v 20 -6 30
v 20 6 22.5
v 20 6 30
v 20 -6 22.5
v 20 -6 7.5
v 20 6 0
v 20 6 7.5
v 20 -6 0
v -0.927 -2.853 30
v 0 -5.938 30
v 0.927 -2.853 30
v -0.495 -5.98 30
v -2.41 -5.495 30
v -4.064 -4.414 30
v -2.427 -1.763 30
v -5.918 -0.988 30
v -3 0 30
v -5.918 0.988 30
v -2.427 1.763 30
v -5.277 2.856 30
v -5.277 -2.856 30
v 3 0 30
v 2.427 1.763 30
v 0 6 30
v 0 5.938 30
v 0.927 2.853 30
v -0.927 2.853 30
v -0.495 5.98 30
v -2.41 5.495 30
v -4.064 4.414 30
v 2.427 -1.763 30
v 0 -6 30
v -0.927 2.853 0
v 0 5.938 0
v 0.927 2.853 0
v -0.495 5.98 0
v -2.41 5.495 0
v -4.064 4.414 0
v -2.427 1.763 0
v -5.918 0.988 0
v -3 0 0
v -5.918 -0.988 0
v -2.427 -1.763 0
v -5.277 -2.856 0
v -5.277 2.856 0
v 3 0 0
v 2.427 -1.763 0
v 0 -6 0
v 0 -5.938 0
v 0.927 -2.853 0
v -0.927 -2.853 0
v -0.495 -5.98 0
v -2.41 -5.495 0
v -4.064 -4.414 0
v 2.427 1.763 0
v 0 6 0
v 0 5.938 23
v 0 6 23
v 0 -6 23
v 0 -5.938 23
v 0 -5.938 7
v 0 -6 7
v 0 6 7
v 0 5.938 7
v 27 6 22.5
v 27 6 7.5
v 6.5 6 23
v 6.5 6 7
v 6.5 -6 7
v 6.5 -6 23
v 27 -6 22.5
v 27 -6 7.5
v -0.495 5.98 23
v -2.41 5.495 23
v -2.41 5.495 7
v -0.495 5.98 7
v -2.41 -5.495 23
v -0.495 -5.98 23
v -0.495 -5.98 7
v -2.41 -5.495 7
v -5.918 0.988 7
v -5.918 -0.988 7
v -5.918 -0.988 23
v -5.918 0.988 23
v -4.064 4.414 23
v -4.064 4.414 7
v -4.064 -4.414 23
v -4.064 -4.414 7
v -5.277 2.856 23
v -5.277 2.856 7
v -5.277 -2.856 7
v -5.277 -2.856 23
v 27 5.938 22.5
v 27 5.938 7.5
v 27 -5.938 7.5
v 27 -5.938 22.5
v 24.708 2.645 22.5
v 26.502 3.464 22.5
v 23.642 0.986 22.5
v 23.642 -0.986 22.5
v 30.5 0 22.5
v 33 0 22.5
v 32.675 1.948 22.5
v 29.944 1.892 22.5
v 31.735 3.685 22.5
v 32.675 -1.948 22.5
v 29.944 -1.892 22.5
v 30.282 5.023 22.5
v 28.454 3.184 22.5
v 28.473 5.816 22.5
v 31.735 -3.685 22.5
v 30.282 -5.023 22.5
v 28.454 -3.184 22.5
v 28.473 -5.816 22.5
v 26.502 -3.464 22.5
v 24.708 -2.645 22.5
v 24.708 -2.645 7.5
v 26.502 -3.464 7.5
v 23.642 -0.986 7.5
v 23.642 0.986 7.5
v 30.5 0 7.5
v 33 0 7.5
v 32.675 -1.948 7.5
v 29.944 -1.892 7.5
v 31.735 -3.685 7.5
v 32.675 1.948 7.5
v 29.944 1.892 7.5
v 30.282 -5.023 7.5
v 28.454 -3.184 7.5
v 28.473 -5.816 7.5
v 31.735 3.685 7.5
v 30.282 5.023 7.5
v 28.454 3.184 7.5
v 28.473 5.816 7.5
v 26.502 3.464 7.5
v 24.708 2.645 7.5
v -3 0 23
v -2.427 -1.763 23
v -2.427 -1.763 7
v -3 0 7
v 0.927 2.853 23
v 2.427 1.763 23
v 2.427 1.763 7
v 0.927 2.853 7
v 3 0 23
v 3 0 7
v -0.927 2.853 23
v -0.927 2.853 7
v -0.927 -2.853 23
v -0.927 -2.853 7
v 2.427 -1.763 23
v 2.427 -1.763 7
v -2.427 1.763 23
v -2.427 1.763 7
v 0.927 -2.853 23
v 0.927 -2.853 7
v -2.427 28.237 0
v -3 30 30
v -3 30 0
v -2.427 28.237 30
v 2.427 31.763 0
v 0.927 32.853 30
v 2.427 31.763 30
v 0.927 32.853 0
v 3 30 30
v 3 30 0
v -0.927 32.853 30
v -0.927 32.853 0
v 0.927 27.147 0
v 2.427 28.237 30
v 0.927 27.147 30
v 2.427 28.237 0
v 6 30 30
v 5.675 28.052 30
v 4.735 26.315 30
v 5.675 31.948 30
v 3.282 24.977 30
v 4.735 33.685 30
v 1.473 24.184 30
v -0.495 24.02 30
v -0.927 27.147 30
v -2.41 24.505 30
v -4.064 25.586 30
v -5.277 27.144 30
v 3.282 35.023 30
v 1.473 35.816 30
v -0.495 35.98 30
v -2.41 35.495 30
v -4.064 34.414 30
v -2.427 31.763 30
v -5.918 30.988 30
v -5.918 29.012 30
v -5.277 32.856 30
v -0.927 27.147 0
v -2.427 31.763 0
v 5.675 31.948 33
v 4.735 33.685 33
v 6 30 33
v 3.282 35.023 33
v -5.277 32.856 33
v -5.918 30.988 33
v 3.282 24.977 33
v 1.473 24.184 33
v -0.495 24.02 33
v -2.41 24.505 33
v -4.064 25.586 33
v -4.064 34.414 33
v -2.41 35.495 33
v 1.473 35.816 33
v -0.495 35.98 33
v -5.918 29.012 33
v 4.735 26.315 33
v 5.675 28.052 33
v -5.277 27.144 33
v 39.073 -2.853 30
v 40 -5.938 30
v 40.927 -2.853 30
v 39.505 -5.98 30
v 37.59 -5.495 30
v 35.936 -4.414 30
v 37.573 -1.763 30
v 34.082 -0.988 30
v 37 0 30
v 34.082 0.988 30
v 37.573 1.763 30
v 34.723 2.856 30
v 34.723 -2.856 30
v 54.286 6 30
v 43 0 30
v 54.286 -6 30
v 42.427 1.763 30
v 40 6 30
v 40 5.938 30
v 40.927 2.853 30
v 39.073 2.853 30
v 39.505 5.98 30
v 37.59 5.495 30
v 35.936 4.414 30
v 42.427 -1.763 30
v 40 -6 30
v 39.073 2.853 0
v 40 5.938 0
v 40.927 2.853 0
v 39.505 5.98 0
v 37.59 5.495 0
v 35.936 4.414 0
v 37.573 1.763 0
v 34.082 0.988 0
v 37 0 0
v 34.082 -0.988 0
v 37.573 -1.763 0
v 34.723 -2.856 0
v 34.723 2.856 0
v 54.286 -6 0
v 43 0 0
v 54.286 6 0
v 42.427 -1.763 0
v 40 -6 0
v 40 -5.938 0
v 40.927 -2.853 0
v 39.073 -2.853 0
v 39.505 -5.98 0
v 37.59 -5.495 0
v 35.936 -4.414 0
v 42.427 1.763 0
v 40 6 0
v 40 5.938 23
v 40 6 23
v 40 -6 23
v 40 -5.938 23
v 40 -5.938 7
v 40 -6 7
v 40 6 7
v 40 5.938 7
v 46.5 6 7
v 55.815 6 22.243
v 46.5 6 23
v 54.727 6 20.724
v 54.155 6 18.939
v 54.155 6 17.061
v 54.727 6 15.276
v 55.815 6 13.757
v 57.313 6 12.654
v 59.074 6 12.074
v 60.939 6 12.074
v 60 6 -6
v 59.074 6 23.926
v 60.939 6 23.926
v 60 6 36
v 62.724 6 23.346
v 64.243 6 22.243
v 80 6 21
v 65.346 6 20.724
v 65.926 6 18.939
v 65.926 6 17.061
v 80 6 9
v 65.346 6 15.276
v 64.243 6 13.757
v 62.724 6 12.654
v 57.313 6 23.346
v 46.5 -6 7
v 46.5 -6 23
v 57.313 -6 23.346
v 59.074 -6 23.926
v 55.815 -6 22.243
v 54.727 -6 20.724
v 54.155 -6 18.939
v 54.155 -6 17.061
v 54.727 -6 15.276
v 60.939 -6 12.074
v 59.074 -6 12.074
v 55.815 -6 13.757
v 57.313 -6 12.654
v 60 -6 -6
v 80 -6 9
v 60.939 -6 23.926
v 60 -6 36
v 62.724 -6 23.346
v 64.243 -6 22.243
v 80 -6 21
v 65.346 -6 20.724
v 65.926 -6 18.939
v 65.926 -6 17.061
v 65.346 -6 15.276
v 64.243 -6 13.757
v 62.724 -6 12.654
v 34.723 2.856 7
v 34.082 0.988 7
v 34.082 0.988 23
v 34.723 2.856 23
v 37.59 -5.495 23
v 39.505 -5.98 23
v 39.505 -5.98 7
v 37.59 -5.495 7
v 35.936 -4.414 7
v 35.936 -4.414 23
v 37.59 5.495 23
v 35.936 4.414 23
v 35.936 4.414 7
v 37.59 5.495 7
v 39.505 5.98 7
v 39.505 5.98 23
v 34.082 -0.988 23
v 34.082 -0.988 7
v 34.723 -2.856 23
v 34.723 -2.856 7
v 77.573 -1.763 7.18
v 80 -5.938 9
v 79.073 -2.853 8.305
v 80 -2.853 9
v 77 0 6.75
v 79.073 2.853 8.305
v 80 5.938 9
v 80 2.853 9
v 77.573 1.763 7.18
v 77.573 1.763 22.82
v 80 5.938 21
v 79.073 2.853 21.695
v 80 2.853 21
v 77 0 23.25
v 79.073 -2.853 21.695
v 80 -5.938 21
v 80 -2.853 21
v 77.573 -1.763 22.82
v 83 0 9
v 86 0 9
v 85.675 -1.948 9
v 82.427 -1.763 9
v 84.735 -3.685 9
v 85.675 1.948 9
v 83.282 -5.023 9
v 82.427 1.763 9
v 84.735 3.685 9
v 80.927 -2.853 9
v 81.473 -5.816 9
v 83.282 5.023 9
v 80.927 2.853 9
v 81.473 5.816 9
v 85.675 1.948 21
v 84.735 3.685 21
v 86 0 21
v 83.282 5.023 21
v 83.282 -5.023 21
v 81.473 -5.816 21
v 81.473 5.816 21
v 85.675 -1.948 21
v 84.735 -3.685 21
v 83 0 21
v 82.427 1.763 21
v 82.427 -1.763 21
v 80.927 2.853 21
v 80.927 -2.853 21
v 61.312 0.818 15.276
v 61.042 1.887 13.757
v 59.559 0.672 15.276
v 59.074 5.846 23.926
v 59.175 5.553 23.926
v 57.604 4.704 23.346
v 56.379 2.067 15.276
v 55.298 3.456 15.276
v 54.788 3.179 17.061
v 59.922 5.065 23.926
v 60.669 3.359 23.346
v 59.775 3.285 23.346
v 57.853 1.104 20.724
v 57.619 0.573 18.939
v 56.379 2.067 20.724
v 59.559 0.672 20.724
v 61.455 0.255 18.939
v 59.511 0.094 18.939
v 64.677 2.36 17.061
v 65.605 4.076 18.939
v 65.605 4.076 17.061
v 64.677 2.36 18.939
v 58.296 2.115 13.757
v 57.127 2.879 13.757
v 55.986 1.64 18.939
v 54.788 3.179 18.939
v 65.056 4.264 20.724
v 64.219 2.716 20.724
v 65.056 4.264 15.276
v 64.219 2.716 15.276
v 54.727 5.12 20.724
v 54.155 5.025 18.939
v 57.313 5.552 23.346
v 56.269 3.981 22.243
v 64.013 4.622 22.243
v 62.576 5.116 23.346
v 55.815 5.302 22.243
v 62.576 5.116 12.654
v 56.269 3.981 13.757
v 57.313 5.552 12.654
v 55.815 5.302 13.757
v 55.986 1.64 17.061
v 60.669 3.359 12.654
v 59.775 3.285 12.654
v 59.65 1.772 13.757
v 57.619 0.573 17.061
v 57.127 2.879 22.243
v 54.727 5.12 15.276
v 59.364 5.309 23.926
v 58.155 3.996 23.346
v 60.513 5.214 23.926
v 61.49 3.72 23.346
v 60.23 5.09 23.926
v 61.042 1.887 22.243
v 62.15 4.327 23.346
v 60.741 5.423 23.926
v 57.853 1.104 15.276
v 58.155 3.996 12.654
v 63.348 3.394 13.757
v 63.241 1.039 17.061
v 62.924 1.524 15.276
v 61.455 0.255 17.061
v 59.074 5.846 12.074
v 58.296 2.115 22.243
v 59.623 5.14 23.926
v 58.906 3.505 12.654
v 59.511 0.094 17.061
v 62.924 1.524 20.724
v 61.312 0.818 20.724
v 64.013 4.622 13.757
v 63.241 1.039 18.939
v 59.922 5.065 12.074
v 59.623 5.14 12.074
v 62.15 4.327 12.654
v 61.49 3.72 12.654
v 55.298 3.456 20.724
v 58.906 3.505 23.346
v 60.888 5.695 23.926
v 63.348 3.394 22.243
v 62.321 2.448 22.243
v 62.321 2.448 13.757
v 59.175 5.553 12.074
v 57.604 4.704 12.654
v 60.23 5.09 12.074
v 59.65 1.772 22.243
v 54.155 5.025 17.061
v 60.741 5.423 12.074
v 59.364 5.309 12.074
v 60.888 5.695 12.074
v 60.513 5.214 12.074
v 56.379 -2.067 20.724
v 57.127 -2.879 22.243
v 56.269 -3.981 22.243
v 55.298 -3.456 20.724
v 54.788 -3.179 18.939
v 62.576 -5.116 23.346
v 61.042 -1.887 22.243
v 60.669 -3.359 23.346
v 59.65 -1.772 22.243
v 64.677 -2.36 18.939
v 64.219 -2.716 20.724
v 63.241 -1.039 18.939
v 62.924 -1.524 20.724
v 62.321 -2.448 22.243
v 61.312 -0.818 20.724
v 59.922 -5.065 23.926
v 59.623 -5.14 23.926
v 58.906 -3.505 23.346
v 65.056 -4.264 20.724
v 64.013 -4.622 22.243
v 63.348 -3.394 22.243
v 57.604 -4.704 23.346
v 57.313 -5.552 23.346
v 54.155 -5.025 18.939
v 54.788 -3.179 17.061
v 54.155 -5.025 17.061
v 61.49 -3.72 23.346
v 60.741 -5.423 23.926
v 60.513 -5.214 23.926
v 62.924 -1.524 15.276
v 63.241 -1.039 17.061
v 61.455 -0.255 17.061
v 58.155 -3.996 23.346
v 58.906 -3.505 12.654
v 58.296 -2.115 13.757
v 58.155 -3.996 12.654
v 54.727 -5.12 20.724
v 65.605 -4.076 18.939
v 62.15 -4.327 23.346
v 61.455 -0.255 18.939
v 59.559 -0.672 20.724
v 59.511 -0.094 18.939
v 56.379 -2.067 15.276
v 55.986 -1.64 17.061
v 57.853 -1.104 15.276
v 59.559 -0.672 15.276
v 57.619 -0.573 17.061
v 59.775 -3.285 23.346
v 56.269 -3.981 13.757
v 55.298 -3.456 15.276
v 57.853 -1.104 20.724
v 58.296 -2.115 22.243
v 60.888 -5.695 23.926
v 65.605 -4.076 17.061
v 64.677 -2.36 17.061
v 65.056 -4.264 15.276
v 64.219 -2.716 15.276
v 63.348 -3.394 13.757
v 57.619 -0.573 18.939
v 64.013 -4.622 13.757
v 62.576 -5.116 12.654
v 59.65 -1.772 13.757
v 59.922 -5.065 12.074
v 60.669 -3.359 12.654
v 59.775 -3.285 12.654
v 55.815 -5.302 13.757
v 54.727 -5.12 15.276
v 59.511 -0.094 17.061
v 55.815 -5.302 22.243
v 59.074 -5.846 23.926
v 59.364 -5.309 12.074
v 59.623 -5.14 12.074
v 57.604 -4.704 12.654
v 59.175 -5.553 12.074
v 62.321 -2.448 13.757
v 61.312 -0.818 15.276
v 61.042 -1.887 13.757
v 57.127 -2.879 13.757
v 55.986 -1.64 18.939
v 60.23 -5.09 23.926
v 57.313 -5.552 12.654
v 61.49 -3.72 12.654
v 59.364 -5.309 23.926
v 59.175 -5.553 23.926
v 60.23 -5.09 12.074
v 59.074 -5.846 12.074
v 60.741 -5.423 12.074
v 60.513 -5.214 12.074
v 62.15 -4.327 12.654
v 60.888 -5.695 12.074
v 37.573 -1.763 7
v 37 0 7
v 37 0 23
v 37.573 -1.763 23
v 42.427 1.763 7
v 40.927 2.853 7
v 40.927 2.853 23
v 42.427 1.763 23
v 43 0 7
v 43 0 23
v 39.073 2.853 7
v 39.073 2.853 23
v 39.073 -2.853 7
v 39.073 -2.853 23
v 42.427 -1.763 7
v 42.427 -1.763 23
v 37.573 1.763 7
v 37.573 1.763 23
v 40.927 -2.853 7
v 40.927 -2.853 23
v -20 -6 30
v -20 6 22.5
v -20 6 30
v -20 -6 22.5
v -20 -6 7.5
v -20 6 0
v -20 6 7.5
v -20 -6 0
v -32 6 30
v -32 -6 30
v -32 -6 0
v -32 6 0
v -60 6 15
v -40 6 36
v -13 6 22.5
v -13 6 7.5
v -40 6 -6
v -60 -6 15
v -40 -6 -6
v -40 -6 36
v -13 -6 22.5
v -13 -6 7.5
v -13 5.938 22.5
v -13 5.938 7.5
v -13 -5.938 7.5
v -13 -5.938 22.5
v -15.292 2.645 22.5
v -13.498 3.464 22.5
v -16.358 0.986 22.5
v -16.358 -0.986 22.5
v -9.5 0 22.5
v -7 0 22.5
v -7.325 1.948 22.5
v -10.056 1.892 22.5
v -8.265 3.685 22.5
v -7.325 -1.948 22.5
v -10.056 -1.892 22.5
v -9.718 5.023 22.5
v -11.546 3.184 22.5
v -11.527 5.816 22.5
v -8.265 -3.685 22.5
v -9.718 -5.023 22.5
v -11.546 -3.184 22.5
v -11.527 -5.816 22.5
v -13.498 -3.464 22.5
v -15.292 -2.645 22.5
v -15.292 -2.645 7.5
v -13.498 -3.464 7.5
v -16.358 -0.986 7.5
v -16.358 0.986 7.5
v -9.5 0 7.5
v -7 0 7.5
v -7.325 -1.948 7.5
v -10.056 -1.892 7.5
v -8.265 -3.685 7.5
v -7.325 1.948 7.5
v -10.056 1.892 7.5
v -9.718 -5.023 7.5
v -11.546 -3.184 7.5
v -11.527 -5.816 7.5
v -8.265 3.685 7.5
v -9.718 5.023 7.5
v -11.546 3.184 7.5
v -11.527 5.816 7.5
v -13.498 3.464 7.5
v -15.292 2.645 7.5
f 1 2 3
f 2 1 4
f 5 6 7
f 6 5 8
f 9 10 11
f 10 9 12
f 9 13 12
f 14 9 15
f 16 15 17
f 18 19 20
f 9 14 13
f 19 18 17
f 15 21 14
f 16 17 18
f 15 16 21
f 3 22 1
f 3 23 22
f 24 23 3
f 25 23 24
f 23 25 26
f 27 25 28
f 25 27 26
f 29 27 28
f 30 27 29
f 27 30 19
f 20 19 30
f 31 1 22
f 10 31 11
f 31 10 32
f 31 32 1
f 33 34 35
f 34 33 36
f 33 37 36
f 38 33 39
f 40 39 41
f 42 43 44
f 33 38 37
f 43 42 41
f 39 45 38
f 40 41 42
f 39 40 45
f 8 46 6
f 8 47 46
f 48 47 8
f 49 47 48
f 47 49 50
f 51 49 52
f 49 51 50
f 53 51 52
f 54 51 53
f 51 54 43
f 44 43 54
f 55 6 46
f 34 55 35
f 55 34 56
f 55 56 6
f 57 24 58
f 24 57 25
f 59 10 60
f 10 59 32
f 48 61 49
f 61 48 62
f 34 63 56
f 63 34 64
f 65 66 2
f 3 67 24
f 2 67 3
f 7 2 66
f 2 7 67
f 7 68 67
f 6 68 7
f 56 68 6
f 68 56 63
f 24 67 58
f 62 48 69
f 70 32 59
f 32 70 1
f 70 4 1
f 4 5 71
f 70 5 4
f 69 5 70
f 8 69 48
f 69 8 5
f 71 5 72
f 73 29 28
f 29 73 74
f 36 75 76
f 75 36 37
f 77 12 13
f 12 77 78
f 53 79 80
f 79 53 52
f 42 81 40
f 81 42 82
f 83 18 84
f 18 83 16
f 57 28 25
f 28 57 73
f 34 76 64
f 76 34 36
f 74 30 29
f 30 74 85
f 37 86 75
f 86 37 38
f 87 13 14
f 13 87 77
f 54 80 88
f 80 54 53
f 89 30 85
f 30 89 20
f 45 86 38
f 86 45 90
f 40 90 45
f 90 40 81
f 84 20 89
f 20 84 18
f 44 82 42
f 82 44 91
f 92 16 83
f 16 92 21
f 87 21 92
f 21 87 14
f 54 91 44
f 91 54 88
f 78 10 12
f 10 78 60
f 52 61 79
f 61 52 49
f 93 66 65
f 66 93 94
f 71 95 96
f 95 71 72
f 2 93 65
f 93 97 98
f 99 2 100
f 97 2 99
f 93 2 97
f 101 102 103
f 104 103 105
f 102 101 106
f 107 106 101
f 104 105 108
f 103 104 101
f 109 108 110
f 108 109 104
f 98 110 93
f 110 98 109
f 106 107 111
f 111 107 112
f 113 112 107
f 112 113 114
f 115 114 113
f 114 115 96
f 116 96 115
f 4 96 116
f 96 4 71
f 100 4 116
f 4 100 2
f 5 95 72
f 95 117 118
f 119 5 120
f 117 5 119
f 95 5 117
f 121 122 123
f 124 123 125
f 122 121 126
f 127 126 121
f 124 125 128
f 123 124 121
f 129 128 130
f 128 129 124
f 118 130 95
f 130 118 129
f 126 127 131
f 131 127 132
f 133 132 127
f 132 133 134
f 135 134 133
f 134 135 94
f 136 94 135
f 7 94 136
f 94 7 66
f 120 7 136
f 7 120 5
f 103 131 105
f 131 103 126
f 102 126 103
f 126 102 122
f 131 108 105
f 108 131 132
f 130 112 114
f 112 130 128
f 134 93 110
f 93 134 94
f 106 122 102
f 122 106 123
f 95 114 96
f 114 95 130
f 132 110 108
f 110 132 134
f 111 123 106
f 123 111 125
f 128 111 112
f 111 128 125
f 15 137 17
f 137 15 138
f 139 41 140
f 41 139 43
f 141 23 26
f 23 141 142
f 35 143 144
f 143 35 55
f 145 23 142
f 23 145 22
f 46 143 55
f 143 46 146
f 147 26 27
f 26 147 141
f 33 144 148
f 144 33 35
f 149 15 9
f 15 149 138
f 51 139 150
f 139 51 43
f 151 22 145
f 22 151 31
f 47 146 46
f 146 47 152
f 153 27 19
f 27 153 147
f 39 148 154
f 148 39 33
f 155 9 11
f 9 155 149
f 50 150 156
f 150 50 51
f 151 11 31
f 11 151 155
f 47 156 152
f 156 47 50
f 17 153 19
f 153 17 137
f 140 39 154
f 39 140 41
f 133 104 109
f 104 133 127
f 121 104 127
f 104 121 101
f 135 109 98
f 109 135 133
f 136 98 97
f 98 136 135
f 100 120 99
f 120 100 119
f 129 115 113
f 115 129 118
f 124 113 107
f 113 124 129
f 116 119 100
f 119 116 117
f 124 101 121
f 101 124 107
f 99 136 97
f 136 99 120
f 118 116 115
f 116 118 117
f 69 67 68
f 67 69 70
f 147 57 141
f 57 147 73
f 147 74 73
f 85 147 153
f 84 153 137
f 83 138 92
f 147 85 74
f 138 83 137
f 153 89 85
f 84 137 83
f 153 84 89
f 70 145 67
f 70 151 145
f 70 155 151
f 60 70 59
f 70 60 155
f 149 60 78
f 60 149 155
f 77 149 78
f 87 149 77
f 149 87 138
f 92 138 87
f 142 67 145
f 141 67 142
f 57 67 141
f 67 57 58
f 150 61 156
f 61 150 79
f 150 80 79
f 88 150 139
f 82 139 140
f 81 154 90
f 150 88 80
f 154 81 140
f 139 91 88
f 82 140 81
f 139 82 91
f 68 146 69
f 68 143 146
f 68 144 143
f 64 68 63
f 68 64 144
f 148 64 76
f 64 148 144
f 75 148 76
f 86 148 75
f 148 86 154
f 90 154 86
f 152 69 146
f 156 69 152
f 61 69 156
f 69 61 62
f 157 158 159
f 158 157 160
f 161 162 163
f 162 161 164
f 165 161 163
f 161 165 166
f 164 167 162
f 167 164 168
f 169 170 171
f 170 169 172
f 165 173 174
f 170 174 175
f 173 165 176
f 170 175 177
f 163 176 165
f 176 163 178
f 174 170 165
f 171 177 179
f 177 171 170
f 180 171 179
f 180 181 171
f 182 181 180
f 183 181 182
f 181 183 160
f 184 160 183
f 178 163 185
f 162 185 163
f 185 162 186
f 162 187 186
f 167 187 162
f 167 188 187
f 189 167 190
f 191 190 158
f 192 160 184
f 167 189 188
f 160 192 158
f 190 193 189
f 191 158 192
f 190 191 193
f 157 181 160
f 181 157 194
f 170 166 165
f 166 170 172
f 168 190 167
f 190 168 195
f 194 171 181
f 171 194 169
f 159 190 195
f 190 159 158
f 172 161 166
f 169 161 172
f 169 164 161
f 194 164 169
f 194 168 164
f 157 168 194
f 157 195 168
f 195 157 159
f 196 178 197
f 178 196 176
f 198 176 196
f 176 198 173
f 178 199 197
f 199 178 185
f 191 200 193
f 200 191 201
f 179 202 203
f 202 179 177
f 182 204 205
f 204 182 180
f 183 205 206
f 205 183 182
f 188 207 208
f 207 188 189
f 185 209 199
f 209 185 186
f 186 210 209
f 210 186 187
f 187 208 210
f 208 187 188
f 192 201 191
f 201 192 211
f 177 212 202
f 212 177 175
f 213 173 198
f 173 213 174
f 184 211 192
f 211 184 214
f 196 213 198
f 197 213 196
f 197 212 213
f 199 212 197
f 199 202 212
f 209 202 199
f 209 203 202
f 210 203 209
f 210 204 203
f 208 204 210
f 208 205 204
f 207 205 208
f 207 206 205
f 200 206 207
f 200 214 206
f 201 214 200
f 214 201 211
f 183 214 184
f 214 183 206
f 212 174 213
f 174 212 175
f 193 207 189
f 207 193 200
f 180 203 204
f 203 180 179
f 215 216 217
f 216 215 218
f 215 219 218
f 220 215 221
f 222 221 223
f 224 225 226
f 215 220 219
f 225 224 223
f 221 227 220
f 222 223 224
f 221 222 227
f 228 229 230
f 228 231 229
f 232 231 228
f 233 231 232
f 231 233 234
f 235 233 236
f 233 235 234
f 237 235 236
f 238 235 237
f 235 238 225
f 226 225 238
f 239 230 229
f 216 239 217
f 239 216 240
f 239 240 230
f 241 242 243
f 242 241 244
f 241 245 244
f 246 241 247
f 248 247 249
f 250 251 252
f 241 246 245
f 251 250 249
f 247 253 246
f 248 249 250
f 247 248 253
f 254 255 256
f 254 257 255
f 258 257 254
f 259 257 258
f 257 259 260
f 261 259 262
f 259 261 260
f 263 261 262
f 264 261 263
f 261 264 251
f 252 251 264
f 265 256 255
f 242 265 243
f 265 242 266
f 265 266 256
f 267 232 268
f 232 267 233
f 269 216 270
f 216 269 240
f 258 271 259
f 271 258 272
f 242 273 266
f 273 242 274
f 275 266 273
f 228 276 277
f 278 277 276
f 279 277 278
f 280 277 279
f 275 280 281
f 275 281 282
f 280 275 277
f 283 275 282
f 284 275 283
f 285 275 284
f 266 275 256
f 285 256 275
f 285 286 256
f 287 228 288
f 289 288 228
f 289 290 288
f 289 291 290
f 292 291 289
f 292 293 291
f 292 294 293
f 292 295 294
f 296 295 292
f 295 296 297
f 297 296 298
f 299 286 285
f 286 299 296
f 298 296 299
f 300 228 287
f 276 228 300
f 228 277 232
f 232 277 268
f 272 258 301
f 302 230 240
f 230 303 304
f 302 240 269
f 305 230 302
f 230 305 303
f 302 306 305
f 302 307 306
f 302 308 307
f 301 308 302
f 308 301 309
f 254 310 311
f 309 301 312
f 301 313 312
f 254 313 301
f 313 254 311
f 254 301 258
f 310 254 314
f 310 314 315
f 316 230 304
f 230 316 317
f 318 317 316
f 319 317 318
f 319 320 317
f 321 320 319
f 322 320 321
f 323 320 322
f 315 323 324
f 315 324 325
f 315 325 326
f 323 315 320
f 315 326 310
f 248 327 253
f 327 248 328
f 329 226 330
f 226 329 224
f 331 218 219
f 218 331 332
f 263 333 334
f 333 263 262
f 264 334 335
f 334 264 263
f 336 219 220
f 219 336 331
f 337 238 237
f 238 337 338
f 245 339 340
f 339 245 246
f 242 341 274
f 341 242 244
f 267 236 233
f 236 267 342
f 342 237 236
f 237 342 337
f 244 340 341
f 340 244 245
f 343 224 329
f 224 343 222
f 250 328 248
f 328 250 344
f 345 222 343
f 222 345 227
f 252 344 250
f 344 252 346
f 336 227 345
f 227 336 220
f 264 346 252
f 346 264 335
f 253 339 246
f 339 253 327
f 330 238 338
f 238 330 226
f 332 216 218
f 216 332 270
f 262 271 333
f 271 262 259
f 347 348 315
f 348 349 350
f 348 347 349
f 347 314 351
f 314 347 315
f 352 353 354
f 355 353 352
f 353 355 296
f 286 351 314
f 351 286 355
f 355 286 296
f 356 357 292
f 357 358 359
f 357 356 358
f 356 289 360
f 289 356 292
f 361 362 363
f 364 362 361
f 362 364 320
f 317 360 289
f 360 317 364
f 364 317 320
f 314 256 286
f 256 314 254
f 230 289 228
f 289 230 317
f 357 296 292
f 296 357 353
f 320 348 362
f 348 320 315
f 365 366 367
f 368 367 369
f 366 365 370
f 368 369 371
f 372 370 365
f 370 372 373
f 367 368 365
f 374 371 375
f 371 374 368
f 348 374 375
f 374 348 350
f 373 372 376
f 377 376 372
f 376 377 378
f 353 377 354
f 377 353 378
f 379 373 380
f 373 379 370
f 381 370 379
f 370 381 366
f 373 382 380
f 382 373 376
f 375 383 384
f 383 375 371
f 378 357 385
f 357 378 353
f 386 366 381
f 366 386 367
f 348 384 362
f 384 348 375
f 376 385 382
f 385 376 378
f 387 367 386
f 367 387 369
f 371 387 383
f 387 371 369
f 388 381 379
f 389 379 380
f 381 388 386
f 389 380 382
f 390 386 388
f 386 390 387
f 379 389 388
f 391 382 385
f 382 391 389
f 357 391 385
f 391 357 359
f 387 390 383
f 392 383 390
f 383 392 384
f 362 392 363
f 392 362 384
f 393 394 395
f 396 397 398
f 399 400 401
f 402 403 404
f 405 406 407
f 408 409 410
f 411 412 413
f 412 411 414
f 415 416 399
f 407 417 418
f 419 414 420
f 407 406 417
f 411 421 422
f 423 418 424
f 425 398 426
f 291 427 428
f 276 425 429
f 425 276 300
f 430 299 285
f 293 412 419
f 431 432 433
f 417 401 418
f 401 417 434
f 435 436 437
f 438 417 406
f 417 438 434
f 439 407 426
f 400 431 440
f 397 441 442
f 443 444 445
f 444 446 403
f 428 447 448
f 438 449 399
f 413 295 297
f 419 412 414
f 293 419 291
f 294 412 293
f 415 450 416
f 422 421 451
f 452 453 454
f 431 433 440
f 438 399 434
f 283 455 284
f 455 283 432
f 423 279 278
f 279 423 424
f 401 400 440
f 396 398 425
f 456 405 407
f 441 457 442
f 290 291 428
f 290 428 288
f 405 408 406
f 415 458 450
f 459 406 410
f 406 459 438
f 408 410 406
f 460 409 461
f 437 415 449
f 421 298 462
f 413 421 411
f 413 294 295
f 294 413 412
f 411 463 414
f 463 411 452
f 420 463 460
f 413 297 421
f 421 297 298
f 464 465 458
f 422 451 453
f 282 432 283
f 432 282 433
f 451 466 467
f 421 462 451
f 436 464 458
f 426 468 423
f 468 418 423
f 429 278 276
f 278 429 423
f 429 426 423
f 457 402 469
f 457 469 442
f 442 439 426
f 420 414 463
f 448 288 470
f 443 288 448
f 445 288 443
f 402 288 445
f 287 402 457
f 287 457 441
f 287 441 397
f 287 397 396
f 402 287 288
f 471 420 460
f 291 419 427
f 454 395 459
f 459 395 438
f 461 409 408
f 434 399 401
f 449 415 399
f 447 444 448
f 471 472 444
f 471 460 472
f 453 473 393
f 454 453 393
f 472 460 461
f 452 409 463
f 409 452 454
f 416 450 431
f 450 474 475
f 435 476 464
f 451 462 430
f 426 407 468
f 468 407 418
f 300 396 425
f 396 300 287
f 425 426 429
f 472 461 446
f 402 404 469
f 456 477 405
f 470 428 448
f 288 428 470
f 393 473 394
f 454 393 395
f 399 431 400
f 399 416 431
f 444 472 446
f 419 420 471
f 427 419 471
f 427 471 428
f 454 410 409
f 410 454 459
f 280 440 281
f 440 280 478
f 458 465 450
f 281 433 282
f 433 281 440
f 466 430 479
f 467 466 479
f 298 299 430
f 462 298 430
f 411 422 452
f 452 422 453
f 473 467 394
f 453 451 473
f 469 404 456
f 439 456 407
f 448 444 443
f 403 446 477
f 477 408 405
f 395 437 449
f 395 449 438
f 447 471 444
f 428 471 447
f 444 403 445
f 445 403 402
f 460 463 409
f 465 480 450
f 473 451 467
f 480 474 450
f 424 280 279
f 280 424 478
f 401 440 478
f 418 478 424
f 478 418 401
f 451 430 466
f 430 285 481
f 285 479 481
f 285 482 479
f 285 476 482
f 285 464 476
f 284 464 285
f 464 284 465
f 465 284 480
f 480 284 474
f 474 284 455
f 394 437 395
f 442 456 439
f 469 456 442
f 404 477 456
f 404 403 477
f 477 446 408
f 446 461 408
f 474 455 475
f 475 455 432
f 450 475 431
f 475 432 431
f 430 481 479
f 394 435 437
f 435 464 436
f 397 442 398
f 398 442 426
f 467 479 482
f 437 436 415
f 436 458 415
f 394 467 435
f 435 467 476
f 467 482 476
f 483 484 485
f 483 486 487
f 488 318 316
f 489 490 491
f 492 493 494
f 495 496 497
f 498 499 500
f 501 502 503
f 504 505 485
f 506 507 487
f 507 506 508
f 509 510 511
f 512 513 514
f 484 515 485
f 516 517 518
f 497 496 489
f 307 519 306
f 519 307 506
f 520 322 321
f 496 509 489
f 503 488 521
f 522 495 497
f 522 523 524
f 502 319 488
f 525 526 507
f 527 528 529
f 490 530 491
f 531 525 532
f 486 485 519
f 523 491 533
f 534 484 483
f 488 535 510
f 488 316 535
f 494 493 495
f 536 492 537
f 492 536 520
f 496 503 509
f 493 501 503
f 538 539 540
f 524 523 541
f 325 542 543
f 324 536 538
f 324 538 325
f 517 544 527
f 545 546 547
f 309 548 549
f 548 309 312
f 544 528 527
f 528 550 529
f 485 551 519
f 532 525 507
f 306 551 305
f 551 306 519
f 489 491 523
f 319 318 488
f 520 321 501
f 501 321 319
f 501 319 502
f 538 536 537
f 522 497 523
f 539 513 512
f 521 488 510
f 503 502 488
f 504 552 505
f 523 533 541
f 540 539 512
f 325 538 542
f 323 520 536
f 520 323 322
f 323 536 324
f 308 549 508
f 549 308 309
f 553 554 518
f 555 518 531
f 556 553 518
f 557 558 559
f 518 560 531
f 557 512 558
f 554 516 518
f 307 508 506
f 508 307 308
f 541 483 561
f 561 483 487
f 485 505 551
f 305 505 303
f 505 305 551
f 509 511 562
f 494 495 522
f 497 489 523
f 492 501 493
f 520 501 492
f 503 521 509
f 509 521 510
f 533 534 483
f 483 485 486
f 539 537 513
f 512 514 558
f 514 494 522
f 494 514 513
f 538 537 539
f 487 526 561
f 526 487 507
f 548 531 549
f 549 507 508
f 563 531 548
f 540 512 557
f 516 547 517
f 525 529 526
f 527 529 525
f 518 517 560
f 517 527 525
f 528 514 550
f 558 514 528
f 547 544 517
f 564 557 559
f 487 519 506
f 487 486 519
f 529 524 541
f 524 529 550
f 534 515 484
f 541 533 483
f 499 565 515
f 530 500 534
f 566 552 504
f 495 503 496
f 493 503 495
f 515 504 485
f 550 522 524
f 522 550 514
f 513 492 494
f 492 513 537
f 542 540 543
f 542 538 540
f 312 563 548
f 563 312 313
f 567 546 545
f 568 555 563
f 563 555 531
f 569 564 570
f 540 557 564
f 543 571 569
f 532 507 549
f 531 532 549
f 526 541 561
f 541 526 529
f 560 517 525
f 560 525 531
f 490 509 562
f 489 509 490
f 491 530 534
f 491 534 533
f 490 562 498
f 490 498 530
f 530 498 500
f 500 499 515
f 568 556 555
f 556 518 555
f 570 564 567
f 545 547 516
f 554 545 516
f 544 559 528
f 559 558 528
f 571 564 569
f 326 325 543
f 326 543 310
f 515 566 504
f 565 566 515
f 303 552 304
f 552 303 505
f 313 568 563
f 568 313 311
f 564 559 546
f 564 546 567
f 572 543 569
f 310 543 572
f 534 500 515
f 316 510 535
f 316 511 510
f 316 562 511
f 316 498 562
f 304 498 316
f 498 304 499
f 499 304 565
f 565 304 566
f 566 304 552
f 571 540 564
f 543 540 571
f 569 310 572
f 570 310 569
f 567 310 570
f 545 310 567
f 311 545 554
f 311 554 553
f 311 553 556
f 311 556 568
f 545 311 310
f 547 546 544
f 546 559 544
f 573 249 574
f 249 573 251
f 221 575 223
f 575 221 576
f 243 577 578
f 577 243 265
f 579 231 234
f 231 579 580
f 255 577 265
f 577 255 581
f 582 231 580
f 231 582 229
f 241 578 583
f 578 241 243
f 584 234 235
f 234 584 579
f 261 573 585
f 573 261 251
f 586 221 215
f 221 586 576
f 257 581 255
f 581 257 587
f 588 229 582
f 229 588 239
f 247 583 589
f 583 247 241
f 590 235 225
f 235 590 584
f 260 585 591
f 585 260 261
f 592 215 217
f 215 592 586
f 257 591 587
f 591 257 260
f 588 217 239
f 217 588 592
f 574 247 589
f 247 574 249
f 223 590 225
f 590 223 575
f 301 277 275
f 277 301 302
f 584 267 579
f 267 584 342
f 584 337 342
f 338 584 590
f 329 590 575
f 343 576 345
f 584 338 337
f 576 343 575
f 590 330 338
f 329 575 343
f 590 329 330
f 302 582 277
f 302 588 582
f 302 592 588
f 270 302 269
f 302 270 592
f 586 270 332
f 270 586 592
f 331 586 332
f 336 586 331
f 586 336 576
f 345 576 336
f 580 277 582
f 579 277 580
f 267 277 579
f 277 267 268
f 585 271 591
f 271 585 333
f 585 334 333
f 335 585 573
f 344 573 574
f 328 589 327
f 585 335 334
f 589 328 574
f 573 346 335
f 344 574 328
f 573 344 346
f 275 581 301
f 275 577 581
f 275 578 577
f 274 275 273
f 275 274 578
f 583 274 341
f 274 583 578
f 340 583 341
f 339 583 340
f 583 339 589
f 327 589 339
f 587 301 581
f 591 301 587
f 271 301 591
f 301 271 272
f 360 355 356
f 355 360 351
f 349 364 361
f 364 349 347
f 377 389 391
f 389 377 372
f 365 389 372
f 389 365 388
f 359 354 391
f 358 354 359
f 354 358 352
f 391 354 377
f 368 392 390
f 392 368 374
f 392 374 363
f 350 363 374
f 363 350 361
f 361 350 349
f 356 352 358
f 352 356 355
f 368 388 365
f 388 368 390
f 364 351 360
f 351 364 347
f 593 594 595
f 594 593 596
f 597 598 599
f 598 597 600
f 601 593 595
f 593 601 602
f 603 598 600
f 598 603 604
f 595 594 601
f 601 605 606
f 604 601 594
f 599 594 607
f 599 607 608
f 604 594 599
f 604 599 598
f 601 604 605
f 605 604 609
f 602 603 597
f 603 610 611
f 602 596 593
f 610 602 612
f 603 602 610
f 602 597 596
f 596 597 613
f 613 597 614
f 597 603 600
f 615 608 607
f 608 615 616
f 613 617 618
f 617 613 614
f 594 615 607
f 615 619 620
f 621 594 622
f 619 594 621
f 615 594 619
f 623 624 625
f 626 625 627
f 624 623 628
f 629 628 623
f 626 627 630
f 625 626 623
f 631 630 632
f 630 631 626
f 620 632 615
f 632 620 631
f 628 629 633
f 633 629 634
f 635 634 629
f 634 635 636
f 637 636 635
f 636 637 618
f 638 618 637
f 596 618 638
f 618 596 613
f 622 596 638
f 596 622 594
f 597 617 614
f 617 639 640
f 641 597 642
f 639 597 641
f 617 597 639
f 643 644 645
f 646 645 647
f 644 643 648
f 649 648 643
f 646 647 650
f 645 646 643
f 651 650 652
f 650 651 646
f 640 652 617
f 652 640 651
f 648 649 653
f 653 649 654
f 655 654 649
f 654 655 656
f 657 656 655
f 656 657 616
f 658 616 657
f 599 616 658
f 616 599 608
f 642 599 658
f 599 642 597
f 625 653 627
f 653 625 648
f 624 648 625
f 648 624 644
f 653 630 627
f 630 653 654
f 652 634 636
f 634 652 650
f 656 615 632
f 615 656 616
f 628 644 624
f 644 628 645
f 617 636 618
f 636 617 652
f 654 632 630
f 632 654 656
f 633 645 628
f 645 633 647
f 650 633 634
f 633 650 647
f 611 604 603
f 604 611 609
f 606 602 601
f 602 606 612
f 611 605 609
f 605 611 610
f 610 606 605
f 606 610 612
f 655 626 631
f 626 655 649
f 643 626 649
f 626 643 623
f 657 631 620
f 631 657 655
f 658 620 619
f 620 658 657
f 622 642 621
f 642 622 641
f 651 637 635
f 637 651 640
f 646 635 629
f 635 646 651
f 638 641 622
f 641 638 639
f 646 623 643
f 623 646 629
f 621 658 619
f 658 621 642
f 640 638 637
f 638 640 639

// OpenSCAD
limb_w = 20;
limb_h = 30;
limb_d = 12;

s = 3;

margin = 0.5;
small_number = 0.001;
big_number = 200;

difference() {
union() {
translate([0,-limb_d/2,0]) cube([limb_w,limb_d,limb_h]);
cylinder(limb_h,limb_d/2,limb_d/2);
translate([limb_w,-limb_d/2,limb_h/4])
    cube([limb_d/2+2*margin,limb_d,limb_h/2]);
translate([limb_w+limb_d/2+2*margin,0,limb_h/4])
    cylinder(limb_h/2,limb_d/2,limb_d/2);
}

cylinder(big_number,limb_d/2-s,limb_d/2-s,center=true);
translate([limb_w+limb_d/2+2*margin,0,limb_h/4])
    cylinder(big_number,limb_d/2-s+margin,limb_d/2-s+margin,center=true);

translate([-limb_d/2,-limb_d/2,limb_h/4-margin])
cube([limb_d+margin,limb_d,limb_h/2+margin*2]);
}

//screw
translate([0,30,0]) {
cylinder(limb_h,limb_d/2-s,limb_d/2-s);
translate([0,0,limb_h])cylinder(s,limb_d/2,limb_d/2);
}





//head
translate([40,0,0]) {
difference() {
union() {
translate([0,-limb_d/2,0]) cube([limb_w,limb_d,limb_h]);
cylinder(limb_h,limb_d/2,limb_d/2);
translate([limb_w,limb_d/2,0])rotate([90,0,0])linear_extrude(limb_d)polygon([[0,-s*2],[-limb_w,limb_h/2],[0,limb_h+s*2],[limb_w,limb_h/2+limb_d/2],[limb_w,limb_h/2-limb_d/2]]);

translate([limb_w*2,0,limb_h/2-limb_d/2]) cylinder(limb_d,limb_d/2,limb_d/2);
}
translate([limb_w,limb_d/2,limb_h*0.6]) sphere(limb_d/2);
translate([limb_w,-limb_d/2,limb_h*0.6]) sphere(limb_d/2);
cylinder(big_number,limb_d/2-s,limb_d/2-s,center=true);

translate([-limb_d/2,-limb_d/2,limb_h/4-margin])
cube([limb_d+margin,limb_d,limb_h/2+margin*2]);
translate([limb_w*2,0,0]) cylinder(big_number,limb_d/2-s,limb_d/2-s);
}
}

//tail
translate([-40,0,0]) {
difference() {
union() {
translate([0,-limb_d/2,0]) cube([limb_w,limb_d,limb_h]);
translate([limb_w,-limb_d/2,limb_h/4])
    cube([limb_d/2+2*margin,limb_d,limb_h/2]);
translate([limb_w+limb_d/2+2*margin,0,limb_h/4])
    cylinder(limb_h/2,limb_d/2,limb_d/2);
translate([0,limb_d/2,0])rotate([90,0,0])linear_extrude(limb_d)polygon([[0,-s*2],[-limb_w,limb_h/2],[0,limb_h+s*2],[limb_w,limb_h/2+limb_d/2],[limb_w,limb_h/2-limb_d/2]]);
}
translate([limb_w+limb_d/2+2*margin,0,limb_h/4])
    cylinder(big_number,limb_d/2-s+margin,limb_d/2-s+margin,center=true);
}
}
